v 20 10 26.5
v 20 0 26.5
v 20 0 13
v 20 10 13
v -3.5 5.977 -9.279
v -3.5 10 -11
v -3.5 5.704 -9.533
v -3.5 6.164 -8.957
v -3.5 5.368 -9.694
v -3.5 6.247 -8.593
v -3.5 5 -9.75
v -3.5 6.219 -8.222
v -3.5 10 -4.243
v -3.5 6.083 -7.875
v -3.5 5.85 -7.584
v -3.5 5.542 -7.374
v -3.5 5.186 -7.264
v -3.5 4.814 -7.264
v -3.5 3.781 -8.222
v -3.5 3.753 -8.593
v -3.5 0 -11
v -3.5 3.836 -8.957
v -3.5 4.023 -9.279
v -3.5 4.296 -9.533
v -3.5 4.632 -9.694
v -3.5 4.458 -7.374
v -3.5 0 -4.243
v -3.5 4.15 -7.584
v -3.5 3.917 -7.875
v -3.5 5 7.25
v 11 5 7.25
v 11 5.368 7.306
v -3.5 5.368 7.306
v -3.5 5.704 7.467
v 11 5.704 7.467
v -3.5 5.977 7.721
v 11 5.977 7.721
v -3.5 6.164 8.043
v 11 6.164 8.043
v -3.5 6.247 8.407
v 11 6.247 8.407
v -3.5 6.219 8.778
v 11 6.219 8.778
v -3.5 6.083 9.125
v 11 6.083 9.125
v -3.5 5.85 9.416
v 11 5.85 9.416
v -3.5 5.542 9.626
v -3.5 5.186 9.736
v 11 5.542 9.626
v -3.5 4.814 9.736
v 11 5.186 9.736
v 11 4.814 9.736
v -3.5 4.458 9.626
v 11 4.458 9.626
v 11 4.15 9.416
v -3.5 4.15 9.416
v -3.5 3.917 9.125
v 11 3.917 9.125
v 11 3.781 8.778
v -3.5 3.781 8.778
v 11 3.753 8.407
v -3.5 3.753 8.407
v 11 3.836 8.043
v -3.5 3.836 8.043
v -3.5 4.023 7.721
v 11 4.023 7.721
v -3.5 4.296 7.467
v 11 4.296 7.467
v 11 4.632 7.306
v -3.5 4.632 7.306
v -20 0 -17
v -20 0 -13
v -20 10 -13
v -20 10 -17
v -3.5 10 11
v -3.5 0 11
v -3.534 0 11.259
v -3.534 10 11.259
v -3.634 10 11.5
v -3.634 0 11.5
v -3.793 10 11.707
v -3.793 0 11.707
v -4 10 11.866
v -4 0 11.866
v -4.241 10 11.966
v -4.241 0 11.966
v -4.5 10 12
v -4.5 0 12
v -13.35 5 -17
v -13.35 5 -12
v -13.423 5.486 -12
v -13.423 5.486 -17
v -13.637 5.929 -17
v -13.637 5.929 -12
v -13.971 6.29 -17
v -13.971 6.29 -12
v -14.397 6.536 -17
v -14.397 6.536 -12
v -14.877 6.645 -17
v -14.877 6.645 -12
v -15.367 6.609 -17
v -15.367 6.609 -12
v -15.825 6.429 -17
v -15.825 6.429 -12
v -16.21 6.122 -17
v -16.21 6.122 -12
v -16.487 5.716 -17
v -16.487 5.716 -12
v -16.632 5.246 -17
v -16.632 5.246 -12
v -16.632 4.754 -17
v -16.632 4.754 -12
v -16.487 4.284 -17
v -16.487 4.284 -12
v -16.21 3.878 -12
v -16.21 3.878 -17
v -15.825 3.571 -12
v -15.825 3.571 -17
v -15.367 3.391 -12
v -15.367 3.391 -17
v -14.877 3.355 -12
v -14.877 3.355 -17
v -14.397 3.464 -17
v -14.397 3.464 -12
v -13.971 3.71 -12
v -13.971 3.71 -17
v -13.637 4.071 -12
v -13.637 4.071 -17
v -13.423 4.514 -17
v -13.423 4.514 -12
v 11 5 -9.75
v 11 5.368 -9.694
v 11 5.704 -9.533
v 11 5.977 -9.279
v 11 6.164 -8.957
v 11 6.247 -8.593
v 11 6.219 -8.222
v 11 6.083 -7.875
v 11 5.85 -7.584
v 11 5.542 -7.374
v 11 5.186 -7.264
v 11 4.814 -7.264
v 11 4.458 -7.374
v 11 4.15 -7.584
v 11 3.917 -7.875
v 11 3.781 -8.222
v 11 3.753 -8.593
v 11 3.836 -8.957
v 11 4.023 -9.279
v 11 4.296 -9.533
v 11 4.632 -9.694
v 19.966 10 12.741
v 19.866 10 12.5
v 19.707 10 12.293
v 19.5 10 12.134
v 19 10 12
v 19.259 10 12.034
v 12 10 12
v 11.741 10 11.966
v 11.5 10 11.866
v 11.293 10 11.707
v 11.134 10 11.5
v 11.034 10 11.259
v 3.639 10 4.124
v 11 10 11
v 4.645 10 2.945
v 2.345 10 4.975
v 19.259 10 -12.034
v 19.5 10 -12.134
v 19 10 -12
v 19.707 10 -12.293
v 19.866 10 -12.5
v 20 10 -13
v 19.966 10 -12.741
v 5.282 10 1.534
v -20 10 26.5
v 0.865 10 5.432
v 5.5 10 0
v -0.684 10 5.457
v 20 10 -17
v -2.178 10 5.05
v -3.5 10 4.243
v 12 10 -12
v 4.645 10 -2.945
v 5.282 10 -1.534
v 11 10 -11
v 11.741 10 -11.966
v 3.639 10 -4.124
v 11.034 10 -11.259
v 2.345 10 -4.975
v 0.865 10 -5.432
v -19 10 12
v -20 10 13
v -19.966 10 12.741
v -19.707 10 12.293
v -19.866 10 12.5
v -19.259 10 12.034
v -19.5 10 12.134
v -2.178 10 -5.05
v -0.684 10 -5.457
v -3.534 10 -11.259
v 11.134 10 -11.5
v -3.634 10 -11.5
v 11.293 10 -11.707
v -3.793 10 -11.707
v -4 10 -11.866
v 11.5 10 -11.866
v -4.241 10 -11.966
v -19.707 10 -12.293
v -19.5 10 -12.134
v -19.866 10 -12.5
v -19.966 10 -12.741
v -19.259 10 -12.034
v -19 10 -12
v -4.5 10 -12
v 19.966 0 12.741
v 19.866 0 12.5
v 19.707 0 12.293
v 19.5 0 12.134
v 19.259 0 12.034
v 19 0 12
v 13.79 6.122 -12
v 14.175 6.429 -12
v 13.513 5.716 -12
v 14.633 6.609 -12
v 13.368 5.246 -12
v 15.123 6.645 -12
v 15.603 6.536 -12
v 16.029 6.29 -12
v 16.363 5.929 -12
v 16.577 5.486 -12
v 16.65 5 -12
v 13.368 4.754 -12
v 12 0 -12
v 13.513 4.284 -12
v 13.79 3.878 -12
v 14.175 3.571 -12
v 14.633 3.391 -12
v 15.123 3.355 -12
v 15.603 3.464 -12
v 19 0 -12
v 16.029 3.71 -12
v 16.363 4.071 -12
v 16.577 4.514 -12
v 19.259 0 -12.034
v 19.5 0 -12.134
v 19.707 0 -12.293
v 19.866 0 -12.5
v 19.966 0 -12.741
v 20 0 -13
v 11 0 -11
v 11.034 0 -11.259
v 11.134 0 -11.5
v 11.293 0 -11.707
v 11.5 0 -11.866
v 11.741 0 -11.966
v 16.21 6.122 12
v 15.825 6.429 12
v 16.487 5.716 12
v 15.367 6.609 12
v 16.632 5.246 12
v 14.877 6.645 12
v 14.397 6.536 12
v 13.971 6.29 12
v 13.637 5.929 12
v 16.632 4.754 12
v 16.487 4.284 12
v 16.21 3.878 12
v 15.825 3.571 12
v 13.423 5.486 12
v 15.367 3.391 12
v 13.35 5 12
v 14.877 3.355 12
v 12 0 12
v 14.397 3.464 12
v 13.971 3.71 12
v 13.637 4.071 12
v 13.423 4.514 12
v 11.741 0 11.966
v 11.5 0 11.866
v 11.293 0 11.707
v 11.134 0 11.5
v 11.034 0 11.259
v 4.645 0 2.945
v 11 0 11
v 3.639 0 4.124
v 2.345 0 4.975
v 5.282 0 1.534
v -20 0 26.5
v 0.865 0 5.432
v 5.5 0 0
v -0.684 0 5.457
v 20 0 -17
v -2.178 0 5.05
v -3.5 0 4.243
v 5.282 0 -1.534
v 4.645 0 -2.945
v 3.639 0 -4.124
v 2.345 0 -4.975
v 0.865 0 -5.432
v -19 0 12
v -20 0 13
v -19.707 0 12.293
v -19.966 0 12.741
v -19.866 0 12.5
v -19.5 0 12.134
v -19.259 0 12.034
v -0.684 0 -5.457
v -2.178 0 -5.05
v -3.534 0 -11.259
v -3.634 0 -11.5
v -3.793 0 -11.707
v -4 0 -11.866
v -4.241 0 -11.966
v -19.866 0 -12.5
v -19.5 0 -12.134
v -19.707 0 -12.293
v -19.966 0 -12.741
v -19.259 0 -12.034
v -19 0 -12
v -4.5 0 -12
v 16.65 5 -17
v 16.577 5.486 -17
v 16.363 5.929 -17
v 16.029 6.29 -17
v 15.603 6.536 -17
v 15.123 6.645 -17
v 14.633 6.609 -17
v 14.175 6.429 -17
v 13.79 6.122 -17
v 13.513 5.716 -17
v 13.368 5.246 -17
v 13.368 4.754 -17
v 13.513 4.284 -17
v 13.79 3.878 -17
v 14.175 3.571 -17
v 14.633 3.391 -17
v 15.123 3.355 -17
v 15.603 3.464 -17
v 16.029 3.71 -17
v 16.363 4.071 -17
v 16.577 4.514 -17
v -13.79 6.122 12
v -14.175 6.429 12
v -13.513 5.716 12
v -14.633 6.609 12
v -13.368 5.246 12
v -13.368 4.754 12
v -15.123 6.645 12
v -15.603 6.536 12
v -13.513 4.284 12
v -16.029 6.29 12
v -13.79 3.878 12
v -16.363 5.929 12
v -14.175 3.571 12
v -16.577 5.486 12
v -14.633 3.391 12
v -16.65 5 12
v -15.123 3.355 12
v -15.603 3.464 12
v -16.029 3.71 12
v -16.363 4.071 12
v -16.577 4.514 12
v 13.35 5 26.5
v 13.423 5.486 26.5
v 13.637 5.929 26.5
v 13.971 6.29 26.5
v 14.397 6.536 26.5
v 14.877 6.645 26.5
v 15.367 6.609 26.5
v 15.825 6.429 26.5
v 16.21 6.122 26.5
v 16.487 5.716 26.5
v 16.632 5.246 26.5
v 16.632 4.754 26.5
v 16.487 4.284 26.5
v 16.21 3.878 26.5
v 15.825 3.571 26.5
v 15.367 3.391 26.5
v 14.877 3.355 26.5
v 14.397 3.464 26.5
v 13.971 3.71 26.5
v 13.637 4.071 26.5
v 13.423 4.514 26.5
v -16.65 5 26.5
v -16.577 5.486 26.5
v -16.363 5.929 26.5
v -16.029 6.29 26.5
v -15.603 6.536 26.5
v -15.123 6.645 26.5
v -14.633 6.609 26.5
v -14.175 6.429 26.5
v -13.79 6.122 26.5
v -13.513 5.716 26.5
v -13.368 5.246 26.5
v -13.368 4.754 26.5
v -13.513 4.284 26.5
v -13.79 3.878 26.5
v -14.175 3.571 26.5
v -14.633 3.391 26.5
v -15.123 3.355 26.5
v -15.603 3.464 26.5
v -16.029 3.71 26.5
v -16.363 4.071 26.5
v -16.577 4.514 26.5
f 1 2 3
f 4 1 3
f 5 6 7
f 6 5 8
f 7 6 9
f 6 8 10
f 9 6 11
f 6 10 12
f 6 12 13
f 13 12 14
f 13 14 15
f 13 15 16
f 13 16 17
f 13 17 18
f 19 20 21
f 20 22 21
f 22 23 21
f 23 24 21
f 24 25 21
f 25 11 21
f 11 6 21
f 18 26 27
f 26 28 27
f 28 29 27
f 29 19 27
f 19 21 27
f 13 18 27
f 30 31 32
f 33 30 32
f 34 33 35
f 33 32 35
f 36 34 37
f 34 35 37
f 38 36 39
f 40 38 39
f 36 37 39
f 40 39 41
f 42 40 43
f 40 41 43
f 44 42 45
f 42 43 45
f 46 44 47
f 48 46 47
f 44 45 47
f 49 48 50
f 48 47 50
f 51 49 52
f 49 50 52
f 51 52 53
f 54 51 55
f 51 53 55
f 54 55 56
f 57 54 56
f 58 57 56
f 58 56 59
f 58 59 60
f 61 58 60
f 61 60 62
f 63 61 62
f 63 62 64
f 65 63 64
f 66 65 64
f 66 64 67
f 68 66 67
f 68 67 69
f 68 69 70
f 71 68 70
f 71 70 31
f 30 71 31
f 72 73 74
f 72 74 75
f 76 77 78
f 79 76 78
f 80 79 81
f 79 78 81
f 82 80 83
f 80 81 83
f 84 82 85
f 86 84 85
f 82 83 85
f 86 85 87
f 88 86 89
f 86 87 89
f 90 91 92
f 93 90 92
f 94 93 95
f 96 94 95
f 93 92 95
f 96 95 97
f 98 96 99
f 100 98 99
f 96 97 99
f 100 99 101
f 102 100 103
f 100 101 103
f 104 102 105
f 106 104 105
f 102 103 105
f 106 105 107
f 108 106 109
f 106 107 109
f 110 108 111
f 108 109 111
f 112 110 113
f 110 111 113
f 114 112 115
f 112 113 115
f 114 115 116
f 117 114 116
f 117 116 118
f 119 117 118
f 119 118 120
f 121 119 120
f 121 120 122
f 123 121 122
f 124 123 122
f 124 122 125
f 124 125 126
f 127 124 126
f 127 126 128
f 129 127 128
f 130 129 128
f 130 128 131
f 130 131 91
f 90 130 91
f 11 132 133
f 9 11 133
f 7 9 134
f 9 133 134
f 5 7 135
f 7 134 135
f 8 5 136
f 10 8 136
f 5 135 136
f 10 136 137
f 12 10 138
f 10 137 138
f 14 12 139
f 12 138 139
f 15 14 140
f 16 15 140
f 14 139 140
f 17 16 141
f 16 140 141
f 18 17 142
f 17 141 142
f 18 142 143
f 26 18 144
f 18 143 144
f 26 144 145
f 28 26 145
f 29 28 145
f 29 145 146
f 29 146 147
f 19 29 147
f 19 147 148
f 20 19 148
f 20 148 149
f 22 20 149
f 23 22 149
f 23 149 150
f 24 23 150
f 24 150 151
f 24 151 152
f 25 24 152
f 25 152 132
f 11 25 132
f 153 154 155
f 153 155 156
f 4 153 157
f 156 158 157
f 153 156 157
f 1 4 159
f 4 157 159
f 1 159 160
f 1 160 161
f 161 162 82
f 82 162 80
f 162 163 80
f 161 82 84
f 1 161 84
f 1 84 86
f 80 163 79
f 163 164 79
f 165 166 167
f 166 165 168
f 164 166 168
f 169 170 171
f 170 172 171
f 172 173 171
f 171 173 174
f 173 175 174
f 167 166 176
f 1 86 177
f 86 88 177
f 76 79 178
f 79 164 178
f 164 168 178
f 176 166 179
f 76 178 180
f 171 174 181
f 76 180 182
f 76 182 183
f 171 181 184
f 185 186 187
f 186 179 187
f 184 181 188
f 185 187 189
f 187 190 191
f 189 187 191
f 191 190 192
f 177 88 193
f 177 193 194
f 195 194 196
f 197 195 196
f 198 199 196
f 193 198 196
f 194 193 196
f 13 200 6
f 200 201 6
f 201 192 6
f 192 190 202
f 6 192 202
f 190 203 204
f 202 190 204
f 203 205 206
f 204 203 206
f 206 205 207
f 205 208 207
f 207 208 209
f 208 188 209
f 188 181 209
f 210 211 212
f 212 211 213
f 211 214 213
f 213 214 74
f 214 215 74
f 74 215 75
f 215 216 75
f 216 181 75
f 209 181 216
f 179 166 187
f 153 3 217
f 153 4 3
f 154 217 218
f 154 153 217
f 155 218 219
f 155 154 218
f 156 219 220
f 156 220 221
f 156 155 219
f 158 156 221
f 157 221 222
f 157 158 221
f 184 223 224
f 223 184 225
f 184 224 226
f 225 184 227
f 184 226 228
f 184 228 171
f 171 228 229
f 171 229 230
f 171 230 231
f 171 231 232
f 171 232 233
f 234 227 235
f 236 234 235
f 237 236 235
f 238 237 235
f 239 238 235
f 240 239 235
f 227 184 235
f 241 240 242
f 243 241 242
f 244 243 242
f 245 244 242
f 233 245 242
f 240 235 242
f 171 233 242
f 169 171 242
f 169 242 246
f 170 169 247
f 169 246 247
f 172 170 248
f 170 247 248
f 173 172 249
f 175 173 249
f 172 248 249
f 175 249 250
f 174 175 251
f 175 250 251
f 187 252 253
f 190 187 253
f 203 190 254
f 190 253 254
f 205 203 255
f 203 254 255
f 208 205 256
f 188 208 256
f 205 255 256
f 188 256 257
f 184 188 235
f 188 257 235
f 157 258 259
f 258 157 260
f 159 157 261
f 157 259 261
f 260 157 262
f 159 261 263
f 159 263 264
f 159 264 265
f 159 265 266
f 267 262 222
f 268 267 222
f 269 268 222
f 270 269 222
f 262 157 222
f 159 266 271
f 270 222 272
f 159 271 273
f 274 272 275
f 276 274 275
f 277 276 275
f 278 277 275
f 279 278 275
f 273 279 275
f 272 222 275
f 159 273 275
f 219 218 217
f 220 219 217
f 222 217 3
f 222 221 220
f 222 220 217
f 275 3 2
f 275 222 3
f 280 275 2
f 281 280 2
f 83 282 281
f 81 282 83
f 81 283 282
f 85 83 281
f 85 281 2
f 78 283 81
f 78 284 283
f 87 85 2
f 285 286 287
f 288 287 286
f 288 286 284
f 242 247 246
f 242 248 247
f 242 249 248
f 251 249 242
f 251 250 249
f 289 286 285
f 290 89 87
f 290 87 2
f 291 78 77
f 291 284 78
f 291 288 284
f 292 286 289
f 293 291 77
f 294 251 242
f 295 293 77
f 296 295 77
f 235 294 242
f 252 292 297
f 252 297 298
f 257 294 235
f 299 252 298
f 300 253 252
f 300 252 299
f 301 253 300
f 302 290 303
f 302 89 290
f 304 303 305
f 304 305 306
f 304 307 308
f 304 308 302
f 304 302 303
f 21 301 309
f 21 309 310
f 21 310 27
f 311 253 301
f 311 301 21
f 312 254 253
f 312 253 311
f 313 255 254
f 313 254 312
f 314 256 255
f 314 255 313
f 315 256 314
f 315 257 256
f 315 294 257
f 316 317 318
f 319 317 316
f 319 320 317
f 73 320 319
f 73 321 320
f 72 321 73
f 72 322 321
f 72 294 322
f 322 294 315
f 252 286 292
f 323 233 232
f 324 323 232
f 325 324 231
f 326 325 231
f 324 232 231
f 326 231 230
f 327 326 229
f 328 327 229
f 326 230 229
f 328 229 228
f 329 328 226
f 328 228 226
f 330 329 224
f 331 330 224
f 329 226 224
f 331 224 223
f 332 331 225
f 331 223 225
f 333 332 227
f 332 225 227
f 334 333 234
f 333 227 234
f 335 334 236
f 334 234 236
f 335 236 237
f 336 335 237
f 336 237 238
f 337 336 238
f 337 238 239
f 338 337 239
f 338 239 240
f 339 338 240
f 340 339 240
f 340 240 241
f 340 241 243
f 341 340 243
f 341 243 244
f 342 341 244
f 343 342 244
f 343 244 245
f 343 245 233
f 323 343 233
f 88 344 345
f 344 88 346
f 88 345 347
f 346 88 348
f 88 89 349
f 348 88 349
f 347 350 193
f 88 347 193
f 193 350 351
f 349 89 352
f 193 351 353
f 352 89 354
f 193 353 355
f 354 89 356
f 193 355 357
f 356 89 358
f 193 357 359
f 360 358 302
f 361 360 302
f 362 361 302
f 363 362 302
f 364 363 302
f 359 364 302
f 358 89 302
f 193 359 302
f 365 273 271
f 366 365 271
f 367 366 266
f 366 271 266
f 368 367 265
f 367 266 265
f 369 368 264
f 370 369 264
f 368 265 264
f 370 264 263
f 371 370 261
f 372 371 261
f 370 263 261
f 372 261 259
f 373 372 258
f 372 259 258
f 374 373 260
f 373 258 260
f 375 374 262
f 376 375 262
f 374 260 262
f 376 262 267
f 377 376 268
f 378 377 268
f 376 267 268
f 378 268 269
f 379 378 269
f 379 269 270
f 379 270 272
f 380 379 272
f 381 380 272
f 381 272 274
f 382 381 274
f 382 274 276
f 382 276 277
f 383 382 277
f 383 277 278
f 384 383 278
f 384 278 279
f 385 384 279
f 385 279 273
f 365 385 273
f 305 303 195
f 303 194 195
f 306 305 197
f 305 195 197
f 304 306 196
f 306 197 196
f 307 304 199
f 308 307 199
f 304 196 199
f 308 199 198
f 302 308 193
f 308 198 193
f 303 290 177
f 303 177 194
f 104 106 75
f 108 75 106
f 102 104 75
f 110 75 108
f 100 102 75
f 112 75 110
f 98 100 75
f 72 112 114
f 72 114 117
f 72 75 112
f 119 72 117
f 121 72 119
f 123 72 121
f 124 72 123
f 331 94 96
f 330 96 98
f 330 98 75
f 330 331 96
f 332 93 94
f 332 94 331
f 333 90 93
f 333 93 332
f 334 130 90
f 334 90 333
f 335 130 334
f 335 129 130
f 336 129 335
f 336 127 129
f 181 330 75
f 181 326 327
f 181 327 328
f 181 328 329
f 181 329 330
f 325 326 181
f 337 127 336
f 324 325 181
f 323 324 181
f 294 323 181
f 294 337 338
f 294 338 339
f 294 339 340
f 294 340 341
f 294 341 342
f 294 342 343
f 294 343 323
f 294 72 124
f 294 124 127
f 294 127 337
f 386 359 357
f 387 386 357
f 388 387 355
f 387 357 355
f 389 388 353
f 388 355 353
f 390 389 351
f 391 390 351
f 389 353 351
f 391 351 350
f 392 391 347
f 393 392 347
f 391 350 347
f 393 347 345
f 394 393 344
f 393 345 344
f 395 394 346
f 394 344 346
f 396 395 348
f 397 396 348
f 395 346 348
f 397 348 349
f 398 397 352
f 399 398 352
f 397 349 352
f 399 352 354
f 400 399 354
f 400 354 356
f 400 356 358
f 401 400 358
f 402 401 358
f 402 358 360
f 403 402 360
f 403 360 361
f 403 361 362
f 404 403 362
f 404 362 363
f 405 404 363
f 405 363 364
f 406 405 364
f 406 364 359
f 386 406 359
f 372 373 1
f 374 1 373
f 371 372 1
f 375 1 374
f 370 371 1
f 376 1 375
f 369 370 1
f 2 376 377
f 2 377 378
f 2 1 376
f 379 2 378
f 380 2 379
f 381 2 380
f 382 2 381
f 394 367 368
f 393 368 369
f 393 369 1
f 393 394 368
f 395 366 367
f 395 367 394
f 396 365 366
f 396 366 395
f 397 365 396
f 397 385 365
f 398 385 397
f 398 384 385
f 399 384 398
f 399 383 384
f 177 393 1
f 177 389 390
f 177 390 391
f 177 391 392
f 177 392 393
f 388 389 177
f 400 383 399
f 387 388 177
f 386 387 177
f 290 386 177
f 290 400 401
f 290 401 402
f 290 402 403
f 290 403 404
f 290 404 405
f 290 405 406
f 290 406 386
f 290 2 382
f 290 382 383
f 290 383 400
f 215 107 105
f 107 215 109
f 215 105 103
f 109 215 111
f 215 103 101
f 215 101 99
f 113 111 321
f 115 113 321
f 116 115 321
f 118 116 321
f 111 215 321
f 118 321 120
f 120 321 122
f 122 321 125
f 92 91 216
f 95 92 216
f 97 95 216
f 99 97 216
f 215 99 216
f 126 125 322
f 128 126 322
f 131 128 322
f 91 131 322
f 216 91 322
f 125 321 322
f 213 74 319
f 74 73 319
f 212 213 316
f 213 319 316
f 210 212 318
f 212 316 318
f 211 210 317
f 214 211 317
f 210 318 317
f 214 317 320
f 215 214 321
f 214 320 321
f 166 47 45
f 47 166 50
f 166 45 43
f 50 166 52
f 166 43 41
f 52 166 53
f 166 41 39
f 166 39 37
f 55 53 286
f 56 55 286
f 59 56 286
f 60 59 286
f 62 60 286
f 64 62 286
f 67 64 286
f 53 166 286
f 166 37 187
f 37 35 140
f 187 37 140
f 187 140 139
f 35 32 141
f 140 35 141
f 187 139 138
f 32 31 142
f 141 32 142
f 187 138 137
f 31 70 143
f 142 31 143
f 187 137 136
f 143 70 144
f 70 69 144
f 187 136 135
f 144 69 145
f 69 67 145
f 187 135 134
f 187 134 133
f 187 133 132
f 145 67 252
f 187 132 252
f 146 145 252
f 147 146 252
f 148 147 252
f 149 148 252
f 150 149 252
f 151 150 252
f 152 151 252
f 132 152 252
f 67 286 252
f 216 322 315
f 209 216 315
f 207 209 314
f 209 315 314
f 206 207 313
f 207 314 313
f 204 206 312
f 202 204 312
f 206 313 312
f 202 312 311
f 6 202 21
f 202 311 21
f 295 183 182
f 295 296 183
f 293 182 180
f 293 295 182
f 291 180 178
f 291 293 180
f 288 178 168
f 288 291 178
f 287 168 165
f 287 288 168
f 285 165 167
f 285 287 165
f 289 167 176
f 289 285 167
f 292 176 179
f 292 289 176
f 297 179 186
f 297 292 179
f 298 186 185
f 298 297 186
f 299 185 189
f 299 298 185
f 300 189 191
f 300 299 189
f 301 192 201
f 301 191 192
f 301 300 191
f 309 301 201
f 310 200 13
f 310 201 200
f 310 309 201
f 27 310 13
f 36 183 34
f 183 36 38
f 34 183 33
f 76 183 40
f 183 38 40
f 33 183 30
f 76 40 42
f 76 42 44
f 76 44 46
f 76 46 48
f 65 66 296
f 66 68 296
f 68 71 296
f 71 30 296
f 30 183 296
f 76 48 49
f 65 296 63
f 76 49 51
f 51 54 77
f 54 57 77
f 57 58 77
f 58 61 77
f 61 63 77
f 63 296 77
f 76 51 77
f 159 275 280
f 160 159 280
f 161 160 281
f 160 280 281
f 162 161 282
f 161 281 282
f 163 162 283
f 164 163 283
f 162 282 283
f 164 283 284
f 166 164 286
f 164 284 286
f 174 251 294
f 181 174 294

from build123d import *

# Parameters (mm, degrees)
SKETCH_1_W             = 40
SKETCH_1_H             = 34
SKETCH_1_R             = 5.5
EXTRUDE_1_DEPTH        = 10
CUT_EXTRUDE_2_DEPTH    = 29.08914381
FILLET_1_R             = 1
HOLE_WIZARD_M3_1_D     = 2.5
SKETCH_13_W            = 40
SKETCH_13_H            = 9.5
EXTRUDE_2_DEPTH        = 10
HOLE_WIZARD_M4_1_D     = 3.3
HOLE_WIZARD_M4_1_DEPTH = 14.5
HOLE_WIZARD_M4_3_D     = 3.3


with BuildPart() as part:
    # 草图1 → 凸台-拉伸1 (new body)
    with BuildSketch(Plane(origin=(0, 0, 0), x_dir=(1, 0, 0), z_dir=(0, 1, 0))):
        Rectangle(SKETCH_1_W, SKETCH_1_H)
        with Locations(Location((0, 0, 0), (0, 0, 270))):
            Circle(SKETCH_1_R, mode=Mode.SUBTRACT)
    extrude(amount=EXTRUDE_1_DEPTH)

    # 草图3 → 切除-拉伸2 (cut, through all)
    with BuildSketch(Plane.XZ):
        with BuildLine():
            Line((-36.5, -12), (-4.5, -12))
            ThreePointArc((-4.5, -12), (-3.792893219, -11.707106781), (-3.5, -11))
            Line((-3.5, -11), (-3.5, 11))
            ThreePointArc((-3.5, 11), (-3.792893219, 11.707106781), (-4.5, 12))
            Line((-4.5, 12), (-36.5, 12))
            Line((-36.5, 12), (-36.5, -12))
        make_face()
        with BuildLine():
            Line((12, -12), (29, -12))
            Line((29, -12), (29, 12))
            Line((29, 12), (12, 12))
            ThreePointArc((12, 12), (11.292893219, 11.707106781), (11, 11))
            Line((11, 11), (11, -11))
            ThreePointArc((11, -11), (11.292893219, -11.707106781), (12, -12))
        make_face()
    extrude(amount=-CUT_EXTRUDE_2_DEPTH, mode=Mode.SUBTRACT)

    # 圆角1
    fillet_1_edges = [part.edges().sort_by_distance(p)[0] for p in [
        (-20, 5, -12),
        (-20, 5, 12),
        (20, 5, 12),
        (20, 5, -12),
    ]]
    fillet(fillet_1_edges, radius=FILLET_1_R)

    # M3 螺纹孔1 (through all)
    with Locations(Plane.ZY.offset(3.5)):
        with Locations((-8.5, 5), (8.5, 5)):
            Hole(HOLE_WIZARD_M3_1_D / 2)

    # 草图13 → 凸台-拉伸2 (add)
    with BuildSketch(Plane(origin=(0, 0, 0), x_dir=(-1, 0, 0), z_dir=(0, -1, 0))):
        with Locations((0, -21.75)):
            Rectangle(SKETCH_13_W, SKETCH_13_H)
    extrude(amount=-EXTRUDE_2_DEPTH)

    # M4 螺纹孔1
    with Locations(Plane.XY.offset(26.5)):
        with Locations((-15, 5), (15, 5)):
            Hole(HOLE_WIZARD_M4_1_D / 2, depth=HOLE_WIZARD_M4_1_DEPTH)

    # M4 螺纹孔3 (through all)
    with Locations(Plane(origin=(15, 5, -17), x_dir=(-1, 0, 0), z_dir=(0, 0, -1))):
        with Locations((0, 0), (30, 0)):
            Hole(HOLE_WIZARD_M4_3_D / 2)


solid = part.part
